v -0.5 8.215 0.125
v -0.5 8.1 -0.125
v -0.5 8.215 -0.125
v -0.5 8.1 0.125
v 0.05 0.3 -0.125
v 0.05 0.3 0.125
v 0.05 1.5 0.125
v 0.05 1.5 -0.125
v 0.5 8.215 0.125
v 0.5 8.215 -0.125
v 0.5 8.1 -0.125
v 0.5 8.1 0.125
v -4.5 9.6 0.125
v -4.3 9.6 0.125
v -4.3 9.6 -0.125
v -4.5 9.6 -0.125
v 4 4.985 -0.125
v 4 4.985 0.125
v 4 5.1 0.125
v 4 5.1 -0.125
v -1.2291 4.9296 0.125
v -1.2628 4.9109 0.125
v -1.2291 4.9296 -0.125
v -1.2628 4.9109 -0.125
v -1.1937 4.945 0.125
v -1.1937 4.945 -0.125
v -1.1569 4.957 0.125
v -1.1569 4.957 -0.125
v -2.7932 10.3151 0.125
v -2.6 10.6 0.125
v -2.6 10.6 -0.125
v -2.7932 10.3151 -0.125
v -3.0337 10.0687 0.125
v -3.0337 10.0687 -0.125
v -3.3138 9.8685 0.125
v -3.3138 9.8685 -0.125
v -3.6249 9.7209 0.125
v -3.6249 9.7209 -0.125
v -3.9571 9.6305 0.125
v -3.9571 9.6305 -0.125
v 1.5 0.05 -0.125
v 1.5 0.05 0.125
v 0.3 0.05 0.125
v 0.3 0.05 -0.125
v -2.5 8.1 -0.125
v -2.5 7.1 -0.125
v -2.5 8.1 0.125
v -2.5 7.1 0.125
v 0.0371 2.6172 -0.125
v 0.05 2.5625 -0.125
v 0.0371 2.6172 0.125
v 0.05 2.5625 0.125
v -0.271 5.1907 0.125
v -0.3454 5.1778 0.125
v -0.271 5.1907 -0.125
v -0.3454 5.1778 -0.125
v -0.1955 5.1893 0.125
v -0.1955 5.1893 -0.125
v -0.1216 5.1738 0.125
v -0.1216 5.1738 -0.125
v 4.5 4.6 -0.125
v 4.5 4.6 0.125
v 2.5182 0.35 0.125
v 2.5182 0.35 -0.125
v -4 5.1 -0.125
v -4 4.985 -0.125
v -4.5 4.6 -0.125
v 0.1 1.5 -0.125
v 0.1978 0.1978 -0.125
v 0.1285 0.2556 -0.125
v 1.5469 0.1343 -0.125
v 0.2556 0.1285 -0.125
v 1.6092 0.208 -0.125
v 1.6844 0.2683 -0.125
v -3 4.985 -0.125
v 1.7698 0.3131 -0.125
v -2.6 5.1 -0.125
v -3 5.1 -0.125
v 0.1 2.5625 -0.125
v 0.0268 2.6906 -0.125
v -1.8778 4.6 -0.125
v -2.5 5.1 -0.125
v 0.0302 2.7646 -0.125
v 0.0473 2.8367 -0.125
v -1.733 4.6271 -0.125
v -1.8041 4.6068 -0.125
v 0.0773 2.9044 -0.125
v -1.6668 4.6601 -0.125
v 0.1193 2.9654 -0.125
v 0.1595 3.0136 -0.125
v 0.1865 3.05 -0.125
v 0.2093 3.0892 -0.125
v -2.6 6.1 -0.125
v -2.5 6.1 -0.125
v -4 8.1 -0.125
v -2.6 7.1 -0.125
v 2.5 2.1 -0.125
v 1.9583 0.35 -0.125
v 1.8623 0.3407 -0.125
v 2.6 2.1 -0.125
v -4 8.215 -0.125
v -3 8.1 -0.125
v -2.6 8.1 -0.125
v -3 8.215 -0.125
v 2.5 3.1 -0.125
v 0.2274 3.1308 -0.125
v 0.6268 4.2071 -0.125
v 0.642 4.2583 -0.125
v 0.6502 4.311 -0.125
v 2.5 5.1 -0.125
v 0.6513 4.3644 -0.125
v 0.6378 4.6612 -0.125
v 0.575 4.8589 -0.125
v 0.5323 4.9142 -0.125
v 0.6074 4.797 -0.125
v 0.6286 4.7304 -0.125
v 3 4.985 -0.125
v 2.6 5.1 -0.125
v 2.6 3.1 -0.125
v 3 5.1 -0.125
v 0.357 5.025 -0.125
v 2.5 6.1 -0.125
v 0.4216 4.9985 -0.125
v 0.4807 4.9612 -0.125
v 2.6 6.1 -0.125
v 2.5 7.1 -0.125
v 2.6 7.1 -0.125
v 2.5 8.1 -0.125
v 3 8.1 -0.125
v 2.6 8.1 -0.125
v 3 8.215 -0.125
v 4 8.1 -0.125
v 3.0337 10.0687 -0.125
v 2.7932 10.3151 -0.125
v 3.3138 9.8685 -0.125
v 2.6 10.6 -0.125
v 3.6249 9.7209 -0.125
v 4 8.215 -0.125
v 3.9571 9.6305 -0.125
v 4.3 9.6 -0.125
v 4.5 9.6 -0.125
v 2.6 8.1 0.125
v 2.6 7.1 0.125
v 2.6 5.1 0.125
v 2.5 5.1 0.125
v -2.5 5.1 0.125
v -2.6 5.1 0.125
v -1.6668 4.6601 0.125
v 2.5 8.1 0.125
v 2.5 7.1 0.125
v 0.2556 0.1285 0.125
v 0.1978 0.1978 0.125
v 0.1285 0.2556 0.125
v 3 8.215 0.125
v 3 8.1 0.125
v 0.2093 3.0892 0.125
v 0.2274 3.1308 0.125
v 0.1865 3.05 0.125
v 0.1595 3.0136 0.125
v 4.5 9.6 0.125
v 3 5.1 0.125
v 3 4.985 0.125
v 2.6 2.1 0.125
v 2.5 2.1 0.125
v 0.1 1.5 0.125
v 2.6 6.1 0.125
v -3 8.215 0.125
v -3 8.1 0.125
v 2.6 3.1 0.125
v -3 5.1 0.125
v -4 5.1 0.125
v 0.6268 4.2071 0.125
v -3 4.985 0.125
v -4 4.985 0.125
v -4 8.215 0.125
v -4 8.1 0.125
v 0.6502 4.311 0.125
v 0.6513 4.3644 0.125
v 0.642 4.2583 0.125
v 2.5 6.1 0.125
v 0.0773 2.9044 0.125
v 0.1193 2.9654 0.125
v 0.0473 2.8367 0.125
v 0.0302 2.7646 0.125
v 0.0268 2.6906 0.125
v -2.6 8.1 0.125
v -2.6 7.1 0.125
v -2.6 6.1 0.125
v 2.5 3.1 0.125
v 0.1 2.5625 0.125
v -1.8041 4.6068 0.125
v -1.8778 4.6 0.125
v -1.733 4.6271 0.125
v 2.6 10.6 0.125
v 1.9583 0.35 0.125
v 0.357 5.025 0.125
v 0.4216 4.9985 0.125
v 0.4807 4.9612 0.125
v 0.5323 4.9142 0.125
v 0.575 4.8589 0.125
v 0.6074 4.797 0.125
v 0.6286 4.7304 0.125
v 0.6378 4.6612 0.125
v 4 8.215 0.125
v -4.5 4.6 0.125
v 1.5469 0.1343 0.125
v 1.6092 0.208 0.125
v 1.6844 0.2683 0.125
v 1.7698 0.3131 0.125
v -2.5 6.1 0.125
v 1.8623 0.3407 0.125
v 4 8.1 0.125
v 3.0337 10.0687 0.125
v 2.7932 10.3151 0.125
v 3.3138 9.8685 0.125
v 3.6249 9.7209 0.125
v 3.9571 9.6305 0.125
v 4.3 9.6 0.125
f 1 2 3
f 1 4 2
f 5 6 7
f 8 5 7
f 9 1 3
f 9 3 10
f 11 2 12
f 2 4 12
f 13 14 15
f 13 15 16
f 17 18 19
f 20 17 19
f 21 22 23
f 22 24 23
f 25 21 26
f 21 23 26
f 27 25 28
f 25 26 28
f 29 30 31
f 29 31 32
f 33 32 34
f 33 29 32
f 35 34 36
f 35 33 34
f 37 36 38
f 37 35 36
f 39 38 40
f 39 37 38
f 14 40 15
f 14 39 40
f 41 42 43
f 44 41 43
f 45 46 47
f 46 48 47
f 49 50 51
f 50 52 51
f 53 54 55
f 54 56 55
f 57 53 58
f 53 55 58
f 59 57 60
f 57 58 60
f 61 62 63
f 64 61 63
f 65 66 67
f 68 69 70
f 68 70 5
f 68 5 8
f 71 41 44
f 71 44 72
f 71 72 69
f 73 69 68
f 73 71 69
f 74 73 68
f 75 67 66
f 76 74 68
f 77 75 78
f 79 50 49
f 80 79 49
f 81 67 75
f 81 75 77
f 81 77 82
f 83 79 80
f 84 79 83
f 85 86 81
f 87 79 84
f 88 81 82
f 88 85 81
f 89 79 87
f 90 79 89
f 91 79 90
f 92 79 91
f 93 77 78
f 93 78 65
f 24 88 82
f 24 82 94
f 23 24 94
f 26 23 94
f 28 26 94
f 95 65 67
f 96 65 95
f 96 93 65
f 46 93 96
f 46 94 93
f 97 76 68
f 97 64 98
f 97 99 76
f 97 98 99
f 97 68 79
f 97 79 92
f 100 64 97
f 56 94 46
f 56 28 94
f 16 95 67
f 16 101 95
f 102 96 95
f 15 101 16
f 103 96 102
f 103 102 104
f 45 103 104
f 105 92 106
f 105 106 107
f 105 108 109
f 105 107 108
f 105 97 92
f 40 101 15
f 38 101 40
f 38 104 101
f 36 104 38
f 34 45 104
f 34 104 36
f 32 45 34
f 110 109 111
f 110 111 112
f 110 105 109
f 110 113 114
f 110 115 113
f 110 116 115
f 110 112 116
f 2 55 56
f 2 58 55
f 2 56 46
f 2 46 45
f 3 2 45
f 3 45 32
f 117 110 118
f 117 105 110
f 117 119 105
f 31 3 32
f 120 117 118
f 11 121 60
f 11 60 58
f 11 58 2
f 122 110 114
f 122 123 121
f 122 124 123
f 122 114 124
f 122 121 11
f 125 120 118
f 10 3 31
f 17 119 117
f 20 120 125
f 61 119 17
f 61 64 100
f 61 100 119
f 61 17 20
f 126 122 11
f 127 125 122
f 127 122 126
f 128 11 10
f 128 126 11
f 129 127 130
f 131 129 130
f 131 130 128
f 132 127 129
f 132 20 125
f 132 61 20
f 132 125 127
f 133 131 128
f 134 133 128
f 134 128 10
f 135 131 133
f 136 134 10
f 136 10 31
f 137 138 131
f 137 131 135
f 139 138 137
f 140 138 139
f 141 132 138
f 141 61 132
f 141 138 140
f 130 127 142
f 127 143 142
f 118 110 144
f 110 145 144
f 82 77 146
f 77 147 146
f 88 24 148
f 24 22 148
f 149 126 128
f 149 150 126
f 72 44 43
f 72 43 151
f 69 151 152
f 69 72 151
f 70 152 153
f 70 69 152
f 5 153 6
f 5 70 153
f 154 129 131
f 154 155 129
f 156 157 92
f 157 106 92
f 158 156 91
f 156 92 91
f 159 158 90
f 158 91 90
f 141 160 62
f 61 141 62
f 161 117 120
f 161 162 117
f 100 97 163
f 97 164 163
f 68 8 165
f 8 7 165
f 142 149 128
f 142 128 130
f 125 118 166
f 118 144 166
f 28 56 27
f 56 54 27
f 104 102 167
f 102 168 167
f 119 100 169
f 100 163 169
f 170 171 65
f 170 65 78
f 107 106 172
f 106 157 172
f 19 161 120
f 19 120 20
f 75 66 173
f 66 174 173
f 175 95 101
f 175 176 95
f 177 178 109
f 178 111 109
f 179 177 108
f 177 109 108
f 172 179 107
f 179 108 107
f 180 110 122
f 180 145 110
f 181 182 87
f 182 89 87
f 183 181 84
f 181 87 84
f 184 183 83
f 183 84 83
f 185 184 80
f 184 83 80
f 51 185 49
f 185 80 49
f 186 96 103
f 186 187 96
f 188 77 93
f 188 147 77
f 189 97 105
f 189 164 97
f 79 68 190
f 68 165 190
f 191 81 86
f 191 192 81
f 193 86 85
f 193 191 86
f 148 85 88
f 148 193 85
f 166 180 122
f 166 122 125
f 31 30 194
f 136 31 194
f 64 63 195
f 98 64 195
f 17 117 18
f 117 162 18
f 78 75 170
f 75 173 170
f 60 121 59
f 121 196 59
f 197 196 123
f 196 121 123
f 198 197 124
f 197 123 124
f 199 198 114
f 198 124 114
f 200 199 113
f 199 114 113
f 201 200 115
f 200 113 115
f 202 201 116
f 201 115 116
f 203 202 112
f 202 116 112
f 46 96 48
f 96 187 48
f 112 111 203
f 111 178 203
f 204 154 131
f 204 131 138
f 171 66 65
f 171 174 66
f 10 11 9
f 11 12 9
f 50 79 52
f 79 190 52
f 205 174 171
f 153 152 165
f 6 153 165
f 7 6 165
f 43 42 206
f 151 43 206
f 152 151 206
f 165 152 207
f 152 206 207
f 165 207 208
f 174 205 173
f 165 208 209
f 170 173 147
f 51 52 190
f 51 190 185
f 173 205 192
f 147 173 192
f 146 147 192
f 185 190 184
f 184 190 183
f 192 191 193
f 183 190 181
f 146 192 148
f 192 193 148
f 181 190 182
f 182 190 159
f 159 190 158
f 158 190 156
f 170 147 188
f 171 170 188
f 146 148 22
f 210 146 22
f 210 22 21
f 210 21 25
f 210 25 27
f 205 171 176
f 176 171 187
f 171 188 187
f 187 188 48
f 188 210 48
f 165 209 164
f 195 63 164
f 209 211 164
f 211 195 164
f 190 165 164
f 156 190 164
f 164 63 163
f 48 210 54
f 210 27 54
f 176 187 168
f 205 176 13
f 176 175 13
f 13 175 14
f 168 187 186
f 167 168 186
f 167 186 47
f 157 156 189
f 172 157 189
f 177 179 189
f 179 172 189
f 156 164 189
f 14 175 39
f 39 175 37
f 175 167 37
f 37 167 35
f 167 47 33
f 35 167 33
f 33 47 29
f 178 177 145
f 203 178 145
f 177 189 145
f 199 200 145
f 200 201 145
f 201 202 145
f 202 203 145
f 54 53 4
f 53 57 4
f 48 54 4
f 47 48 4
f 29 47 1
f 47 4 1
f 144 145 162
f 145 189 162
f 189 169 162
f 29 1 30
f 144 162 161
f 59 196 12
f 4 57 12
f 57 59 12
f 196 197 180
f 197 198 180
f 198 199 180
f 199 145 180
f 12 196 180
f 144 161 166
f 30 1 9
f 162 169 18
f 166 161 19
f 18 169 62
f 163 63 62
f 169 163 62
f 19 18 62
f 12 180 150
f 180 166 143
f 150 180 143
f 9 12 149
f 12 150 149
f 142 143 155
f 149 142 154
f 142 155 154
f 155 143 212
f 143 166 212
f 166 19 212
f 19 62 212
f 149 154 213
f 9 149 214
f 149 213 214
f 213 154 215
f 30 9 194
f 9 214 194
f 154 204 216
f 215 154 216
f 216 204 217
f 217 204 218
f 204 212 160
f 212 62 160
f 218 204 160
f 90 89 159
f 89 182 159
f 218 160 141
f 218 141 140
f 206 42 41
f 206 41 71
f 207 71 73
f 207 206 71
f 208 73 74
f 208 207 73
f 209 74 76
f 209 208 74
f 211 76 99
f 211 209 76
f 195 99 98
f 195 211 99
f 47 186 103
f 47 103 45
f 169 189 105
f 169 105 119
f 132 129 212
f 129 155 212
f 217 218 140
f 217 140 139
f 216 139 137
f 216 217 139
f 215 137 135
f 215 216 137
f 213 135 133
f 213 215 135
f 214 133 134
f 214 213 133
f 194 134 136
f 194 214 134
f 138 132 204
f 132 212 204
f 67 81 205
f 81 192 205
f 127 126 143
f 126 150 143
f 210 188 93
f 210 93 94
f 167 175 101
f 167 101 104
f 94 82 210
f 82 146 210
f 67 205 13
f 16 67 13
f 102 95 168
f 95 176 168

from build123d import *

# Parameters (mm, degrees)
FRAME_OUTLINE_W     = 1
FRAME_OUTLINE_H     = 0.115
FRAME_OUTLINE_W_2   = 0.1
FRAME_OUTLINE_H_2   = 1
BOSS_EXTRUDE1_DEPTH = 0.125
FILLET1_R           = 0.5
FILLET2_R           = 0.4
CUT_EXTRUDE1_DEPTH  = 12.518354917


with BuildPart() as part:
    # frame_outline → Boss-Extrude1 (new, symmetric)
    with BuildSketch(Plane.XY):
        Polygon((0.05, 0.3), (0.05, 1.5), (0.1, 1.5), (0.1, 2.562485241), (0.05, 2.562485241), (-0.008875073, 2.811860782), (0.203530984, 3.066347223), (0.655022448, 4.283241722), (0.625059951, 4.94163014), (-0.232915246, 5.208434363), (-1.213255559, 4.94163014), (-1.763721297, 4.6), (-4.5, 4.6), (-4.5, 10.6), (4.5, 10.6), (4.5, 4.6), (2.518192453, 0.35), (1.5, 0.35), (1.5, 0.05), (0.3, 0.05), (0.3, 0.3), align=None)
        with Locations((0, 8.1575)):
            Rectangle(FRAME_OUTLINE_W, FRAME_OUTLINE_H, mode=Mode.SUBTRACT)
        with Locations((-2.55, 7.6)):
            Rectangle(FRAME_OUTLINE_W_2, FRAME_OUTLINE_H_2, mode=Mode.SUBTRACT)
        with Locations((-2.55, 5.6)):
            Rectangle(FRAME_OUTLINE_W_2, FRAME_OUTLINE_H_2, mode=Mode.SUBTRACT)
        with Locations((2.55, 7.6)):
            Rectangle(FRAME_OUTLINE_W_2, FRAME_OUTLINE_H_2, mode=Mode.SUBTRACT)
        with Locations((2.55, 5.6)):
            Rectangle(FRAME_OUTLINE_W_2, FRAME_OUTLINE_H_2, mode=Mode.SUBTRACT)
        with Locations((2.55, 2.6)):
            Rectangle(FRAME_OUTLINE_W_2, FRAME_OUTLINE_H_2, mode=Mode.SUBTRACT)
        with Locations((-3.5, 8.1575)):
            Rectangle(FRAME_OUTLINE_W, FRAME_OUTLINE_H, mode=Mode.SUBTRACT)
        with Locations((3.5, 8.1575)):
            Rectangle(FRAME_OUTLINE_W, FRAME_OUTLINE_H, mode=Mode.SUBTRACT)
        with Locations((-3.5, 5.0425)):
            Rectangle(FRAME_OUTLINE_W, FRAME_OUTLINE_H, mode=Mode.SUBTRACT)
        with Locations((3.5, 5.0425)):
            Rectangle(FRAME_OUTLINE_W, FRAME_OUTLINE_H, mode=Mode.SUBTRACT)
    extrude(amount=BOSS_EXTRUDE1_DEPTH, both=True)

    # Fillet1
    # the kernel refuses this fillet: 0.5 mm, written as the material it adds along each edge
    with BuildSketch(Plane(origin=(1.5, 0.35, 0.125), x_dir=(0, -1, 0), z_dir=(0, 0, -1))) as fillet1_piece_1:
        with BuildLine():
            CenterArc((0.5, -0.458257569), FILLET1_R, 113.578178478, 66.421821522)
            Line((0, -0.458257569), (0, 0))
            Line((0, 0), (0.3, 0))
        make_face()
    extrude(amount=0.25)
    with BuildSketch(Plane(origin=(0.3, 0.3, -0.125), x_dir=(0, -1, 0), z_dir=(0, 0, 1))) as fillet1_piece_2:
        with BuildLine():
            CenterArc((0.455718914, -0.455718914), FILLET1_R, 114.295188945, 41.409622109)
            Line((0, -0.25), (0, 0))
            Line((0, 0), (0.25, 0))
        make_face()
    extrude(amount=0.25)

    # Fillet2
    fillet2_edges = [part.edges().sort_by_distance(p)[0] for p in [
        (-0.008875073, 2.811860782, 0),
        (0.203530984, 3.066347223, 0),
        (0.655022448, 4.283241722, 0),
        (0.625059951, 4.94163014, 0),
        (-0.232915246, 5.208434363, 0),
        (-1.213255559, 4.94163014, 0),
        (-1.763721297, 4.6, 0),
    ]]
    fillet(fillet2_edges, radius=FILLET2_R)

    # Sketch1 → Cut-Extrude1 (cut, through all)
    with BuildSketch(Plane.XY.offset(0.125)):
        with BuildLine():
            Line((-4.5, 9.6), (-4.5, 10.6))
            Line((-4.5, 10.6), (-2.6, 10.6))
            ThreePointArc((-2.6, 10.6), (-3.313845854, 9.868537952), (-4.3, 9.6))
            Line((-4.3, 9.6), (-4.5, 9.6))
        make_face()
        with BuildLine():
            Line((4.5, 10.6), (4.5, 9.6))
            Line((4.5, 9.6), (4.3, 9.6))
            ThreePointArc((4.3, 9.6), (3.313845854, 9.868537952), (2.6, 10.6))
            Line((2.6, 10.6), (4.5, 10.6))
        make_face()
    extrude(amount=-CUT_EXTRUDE1_DEPTH, mode=Mode.SUBTRACT)


solid = part.part
